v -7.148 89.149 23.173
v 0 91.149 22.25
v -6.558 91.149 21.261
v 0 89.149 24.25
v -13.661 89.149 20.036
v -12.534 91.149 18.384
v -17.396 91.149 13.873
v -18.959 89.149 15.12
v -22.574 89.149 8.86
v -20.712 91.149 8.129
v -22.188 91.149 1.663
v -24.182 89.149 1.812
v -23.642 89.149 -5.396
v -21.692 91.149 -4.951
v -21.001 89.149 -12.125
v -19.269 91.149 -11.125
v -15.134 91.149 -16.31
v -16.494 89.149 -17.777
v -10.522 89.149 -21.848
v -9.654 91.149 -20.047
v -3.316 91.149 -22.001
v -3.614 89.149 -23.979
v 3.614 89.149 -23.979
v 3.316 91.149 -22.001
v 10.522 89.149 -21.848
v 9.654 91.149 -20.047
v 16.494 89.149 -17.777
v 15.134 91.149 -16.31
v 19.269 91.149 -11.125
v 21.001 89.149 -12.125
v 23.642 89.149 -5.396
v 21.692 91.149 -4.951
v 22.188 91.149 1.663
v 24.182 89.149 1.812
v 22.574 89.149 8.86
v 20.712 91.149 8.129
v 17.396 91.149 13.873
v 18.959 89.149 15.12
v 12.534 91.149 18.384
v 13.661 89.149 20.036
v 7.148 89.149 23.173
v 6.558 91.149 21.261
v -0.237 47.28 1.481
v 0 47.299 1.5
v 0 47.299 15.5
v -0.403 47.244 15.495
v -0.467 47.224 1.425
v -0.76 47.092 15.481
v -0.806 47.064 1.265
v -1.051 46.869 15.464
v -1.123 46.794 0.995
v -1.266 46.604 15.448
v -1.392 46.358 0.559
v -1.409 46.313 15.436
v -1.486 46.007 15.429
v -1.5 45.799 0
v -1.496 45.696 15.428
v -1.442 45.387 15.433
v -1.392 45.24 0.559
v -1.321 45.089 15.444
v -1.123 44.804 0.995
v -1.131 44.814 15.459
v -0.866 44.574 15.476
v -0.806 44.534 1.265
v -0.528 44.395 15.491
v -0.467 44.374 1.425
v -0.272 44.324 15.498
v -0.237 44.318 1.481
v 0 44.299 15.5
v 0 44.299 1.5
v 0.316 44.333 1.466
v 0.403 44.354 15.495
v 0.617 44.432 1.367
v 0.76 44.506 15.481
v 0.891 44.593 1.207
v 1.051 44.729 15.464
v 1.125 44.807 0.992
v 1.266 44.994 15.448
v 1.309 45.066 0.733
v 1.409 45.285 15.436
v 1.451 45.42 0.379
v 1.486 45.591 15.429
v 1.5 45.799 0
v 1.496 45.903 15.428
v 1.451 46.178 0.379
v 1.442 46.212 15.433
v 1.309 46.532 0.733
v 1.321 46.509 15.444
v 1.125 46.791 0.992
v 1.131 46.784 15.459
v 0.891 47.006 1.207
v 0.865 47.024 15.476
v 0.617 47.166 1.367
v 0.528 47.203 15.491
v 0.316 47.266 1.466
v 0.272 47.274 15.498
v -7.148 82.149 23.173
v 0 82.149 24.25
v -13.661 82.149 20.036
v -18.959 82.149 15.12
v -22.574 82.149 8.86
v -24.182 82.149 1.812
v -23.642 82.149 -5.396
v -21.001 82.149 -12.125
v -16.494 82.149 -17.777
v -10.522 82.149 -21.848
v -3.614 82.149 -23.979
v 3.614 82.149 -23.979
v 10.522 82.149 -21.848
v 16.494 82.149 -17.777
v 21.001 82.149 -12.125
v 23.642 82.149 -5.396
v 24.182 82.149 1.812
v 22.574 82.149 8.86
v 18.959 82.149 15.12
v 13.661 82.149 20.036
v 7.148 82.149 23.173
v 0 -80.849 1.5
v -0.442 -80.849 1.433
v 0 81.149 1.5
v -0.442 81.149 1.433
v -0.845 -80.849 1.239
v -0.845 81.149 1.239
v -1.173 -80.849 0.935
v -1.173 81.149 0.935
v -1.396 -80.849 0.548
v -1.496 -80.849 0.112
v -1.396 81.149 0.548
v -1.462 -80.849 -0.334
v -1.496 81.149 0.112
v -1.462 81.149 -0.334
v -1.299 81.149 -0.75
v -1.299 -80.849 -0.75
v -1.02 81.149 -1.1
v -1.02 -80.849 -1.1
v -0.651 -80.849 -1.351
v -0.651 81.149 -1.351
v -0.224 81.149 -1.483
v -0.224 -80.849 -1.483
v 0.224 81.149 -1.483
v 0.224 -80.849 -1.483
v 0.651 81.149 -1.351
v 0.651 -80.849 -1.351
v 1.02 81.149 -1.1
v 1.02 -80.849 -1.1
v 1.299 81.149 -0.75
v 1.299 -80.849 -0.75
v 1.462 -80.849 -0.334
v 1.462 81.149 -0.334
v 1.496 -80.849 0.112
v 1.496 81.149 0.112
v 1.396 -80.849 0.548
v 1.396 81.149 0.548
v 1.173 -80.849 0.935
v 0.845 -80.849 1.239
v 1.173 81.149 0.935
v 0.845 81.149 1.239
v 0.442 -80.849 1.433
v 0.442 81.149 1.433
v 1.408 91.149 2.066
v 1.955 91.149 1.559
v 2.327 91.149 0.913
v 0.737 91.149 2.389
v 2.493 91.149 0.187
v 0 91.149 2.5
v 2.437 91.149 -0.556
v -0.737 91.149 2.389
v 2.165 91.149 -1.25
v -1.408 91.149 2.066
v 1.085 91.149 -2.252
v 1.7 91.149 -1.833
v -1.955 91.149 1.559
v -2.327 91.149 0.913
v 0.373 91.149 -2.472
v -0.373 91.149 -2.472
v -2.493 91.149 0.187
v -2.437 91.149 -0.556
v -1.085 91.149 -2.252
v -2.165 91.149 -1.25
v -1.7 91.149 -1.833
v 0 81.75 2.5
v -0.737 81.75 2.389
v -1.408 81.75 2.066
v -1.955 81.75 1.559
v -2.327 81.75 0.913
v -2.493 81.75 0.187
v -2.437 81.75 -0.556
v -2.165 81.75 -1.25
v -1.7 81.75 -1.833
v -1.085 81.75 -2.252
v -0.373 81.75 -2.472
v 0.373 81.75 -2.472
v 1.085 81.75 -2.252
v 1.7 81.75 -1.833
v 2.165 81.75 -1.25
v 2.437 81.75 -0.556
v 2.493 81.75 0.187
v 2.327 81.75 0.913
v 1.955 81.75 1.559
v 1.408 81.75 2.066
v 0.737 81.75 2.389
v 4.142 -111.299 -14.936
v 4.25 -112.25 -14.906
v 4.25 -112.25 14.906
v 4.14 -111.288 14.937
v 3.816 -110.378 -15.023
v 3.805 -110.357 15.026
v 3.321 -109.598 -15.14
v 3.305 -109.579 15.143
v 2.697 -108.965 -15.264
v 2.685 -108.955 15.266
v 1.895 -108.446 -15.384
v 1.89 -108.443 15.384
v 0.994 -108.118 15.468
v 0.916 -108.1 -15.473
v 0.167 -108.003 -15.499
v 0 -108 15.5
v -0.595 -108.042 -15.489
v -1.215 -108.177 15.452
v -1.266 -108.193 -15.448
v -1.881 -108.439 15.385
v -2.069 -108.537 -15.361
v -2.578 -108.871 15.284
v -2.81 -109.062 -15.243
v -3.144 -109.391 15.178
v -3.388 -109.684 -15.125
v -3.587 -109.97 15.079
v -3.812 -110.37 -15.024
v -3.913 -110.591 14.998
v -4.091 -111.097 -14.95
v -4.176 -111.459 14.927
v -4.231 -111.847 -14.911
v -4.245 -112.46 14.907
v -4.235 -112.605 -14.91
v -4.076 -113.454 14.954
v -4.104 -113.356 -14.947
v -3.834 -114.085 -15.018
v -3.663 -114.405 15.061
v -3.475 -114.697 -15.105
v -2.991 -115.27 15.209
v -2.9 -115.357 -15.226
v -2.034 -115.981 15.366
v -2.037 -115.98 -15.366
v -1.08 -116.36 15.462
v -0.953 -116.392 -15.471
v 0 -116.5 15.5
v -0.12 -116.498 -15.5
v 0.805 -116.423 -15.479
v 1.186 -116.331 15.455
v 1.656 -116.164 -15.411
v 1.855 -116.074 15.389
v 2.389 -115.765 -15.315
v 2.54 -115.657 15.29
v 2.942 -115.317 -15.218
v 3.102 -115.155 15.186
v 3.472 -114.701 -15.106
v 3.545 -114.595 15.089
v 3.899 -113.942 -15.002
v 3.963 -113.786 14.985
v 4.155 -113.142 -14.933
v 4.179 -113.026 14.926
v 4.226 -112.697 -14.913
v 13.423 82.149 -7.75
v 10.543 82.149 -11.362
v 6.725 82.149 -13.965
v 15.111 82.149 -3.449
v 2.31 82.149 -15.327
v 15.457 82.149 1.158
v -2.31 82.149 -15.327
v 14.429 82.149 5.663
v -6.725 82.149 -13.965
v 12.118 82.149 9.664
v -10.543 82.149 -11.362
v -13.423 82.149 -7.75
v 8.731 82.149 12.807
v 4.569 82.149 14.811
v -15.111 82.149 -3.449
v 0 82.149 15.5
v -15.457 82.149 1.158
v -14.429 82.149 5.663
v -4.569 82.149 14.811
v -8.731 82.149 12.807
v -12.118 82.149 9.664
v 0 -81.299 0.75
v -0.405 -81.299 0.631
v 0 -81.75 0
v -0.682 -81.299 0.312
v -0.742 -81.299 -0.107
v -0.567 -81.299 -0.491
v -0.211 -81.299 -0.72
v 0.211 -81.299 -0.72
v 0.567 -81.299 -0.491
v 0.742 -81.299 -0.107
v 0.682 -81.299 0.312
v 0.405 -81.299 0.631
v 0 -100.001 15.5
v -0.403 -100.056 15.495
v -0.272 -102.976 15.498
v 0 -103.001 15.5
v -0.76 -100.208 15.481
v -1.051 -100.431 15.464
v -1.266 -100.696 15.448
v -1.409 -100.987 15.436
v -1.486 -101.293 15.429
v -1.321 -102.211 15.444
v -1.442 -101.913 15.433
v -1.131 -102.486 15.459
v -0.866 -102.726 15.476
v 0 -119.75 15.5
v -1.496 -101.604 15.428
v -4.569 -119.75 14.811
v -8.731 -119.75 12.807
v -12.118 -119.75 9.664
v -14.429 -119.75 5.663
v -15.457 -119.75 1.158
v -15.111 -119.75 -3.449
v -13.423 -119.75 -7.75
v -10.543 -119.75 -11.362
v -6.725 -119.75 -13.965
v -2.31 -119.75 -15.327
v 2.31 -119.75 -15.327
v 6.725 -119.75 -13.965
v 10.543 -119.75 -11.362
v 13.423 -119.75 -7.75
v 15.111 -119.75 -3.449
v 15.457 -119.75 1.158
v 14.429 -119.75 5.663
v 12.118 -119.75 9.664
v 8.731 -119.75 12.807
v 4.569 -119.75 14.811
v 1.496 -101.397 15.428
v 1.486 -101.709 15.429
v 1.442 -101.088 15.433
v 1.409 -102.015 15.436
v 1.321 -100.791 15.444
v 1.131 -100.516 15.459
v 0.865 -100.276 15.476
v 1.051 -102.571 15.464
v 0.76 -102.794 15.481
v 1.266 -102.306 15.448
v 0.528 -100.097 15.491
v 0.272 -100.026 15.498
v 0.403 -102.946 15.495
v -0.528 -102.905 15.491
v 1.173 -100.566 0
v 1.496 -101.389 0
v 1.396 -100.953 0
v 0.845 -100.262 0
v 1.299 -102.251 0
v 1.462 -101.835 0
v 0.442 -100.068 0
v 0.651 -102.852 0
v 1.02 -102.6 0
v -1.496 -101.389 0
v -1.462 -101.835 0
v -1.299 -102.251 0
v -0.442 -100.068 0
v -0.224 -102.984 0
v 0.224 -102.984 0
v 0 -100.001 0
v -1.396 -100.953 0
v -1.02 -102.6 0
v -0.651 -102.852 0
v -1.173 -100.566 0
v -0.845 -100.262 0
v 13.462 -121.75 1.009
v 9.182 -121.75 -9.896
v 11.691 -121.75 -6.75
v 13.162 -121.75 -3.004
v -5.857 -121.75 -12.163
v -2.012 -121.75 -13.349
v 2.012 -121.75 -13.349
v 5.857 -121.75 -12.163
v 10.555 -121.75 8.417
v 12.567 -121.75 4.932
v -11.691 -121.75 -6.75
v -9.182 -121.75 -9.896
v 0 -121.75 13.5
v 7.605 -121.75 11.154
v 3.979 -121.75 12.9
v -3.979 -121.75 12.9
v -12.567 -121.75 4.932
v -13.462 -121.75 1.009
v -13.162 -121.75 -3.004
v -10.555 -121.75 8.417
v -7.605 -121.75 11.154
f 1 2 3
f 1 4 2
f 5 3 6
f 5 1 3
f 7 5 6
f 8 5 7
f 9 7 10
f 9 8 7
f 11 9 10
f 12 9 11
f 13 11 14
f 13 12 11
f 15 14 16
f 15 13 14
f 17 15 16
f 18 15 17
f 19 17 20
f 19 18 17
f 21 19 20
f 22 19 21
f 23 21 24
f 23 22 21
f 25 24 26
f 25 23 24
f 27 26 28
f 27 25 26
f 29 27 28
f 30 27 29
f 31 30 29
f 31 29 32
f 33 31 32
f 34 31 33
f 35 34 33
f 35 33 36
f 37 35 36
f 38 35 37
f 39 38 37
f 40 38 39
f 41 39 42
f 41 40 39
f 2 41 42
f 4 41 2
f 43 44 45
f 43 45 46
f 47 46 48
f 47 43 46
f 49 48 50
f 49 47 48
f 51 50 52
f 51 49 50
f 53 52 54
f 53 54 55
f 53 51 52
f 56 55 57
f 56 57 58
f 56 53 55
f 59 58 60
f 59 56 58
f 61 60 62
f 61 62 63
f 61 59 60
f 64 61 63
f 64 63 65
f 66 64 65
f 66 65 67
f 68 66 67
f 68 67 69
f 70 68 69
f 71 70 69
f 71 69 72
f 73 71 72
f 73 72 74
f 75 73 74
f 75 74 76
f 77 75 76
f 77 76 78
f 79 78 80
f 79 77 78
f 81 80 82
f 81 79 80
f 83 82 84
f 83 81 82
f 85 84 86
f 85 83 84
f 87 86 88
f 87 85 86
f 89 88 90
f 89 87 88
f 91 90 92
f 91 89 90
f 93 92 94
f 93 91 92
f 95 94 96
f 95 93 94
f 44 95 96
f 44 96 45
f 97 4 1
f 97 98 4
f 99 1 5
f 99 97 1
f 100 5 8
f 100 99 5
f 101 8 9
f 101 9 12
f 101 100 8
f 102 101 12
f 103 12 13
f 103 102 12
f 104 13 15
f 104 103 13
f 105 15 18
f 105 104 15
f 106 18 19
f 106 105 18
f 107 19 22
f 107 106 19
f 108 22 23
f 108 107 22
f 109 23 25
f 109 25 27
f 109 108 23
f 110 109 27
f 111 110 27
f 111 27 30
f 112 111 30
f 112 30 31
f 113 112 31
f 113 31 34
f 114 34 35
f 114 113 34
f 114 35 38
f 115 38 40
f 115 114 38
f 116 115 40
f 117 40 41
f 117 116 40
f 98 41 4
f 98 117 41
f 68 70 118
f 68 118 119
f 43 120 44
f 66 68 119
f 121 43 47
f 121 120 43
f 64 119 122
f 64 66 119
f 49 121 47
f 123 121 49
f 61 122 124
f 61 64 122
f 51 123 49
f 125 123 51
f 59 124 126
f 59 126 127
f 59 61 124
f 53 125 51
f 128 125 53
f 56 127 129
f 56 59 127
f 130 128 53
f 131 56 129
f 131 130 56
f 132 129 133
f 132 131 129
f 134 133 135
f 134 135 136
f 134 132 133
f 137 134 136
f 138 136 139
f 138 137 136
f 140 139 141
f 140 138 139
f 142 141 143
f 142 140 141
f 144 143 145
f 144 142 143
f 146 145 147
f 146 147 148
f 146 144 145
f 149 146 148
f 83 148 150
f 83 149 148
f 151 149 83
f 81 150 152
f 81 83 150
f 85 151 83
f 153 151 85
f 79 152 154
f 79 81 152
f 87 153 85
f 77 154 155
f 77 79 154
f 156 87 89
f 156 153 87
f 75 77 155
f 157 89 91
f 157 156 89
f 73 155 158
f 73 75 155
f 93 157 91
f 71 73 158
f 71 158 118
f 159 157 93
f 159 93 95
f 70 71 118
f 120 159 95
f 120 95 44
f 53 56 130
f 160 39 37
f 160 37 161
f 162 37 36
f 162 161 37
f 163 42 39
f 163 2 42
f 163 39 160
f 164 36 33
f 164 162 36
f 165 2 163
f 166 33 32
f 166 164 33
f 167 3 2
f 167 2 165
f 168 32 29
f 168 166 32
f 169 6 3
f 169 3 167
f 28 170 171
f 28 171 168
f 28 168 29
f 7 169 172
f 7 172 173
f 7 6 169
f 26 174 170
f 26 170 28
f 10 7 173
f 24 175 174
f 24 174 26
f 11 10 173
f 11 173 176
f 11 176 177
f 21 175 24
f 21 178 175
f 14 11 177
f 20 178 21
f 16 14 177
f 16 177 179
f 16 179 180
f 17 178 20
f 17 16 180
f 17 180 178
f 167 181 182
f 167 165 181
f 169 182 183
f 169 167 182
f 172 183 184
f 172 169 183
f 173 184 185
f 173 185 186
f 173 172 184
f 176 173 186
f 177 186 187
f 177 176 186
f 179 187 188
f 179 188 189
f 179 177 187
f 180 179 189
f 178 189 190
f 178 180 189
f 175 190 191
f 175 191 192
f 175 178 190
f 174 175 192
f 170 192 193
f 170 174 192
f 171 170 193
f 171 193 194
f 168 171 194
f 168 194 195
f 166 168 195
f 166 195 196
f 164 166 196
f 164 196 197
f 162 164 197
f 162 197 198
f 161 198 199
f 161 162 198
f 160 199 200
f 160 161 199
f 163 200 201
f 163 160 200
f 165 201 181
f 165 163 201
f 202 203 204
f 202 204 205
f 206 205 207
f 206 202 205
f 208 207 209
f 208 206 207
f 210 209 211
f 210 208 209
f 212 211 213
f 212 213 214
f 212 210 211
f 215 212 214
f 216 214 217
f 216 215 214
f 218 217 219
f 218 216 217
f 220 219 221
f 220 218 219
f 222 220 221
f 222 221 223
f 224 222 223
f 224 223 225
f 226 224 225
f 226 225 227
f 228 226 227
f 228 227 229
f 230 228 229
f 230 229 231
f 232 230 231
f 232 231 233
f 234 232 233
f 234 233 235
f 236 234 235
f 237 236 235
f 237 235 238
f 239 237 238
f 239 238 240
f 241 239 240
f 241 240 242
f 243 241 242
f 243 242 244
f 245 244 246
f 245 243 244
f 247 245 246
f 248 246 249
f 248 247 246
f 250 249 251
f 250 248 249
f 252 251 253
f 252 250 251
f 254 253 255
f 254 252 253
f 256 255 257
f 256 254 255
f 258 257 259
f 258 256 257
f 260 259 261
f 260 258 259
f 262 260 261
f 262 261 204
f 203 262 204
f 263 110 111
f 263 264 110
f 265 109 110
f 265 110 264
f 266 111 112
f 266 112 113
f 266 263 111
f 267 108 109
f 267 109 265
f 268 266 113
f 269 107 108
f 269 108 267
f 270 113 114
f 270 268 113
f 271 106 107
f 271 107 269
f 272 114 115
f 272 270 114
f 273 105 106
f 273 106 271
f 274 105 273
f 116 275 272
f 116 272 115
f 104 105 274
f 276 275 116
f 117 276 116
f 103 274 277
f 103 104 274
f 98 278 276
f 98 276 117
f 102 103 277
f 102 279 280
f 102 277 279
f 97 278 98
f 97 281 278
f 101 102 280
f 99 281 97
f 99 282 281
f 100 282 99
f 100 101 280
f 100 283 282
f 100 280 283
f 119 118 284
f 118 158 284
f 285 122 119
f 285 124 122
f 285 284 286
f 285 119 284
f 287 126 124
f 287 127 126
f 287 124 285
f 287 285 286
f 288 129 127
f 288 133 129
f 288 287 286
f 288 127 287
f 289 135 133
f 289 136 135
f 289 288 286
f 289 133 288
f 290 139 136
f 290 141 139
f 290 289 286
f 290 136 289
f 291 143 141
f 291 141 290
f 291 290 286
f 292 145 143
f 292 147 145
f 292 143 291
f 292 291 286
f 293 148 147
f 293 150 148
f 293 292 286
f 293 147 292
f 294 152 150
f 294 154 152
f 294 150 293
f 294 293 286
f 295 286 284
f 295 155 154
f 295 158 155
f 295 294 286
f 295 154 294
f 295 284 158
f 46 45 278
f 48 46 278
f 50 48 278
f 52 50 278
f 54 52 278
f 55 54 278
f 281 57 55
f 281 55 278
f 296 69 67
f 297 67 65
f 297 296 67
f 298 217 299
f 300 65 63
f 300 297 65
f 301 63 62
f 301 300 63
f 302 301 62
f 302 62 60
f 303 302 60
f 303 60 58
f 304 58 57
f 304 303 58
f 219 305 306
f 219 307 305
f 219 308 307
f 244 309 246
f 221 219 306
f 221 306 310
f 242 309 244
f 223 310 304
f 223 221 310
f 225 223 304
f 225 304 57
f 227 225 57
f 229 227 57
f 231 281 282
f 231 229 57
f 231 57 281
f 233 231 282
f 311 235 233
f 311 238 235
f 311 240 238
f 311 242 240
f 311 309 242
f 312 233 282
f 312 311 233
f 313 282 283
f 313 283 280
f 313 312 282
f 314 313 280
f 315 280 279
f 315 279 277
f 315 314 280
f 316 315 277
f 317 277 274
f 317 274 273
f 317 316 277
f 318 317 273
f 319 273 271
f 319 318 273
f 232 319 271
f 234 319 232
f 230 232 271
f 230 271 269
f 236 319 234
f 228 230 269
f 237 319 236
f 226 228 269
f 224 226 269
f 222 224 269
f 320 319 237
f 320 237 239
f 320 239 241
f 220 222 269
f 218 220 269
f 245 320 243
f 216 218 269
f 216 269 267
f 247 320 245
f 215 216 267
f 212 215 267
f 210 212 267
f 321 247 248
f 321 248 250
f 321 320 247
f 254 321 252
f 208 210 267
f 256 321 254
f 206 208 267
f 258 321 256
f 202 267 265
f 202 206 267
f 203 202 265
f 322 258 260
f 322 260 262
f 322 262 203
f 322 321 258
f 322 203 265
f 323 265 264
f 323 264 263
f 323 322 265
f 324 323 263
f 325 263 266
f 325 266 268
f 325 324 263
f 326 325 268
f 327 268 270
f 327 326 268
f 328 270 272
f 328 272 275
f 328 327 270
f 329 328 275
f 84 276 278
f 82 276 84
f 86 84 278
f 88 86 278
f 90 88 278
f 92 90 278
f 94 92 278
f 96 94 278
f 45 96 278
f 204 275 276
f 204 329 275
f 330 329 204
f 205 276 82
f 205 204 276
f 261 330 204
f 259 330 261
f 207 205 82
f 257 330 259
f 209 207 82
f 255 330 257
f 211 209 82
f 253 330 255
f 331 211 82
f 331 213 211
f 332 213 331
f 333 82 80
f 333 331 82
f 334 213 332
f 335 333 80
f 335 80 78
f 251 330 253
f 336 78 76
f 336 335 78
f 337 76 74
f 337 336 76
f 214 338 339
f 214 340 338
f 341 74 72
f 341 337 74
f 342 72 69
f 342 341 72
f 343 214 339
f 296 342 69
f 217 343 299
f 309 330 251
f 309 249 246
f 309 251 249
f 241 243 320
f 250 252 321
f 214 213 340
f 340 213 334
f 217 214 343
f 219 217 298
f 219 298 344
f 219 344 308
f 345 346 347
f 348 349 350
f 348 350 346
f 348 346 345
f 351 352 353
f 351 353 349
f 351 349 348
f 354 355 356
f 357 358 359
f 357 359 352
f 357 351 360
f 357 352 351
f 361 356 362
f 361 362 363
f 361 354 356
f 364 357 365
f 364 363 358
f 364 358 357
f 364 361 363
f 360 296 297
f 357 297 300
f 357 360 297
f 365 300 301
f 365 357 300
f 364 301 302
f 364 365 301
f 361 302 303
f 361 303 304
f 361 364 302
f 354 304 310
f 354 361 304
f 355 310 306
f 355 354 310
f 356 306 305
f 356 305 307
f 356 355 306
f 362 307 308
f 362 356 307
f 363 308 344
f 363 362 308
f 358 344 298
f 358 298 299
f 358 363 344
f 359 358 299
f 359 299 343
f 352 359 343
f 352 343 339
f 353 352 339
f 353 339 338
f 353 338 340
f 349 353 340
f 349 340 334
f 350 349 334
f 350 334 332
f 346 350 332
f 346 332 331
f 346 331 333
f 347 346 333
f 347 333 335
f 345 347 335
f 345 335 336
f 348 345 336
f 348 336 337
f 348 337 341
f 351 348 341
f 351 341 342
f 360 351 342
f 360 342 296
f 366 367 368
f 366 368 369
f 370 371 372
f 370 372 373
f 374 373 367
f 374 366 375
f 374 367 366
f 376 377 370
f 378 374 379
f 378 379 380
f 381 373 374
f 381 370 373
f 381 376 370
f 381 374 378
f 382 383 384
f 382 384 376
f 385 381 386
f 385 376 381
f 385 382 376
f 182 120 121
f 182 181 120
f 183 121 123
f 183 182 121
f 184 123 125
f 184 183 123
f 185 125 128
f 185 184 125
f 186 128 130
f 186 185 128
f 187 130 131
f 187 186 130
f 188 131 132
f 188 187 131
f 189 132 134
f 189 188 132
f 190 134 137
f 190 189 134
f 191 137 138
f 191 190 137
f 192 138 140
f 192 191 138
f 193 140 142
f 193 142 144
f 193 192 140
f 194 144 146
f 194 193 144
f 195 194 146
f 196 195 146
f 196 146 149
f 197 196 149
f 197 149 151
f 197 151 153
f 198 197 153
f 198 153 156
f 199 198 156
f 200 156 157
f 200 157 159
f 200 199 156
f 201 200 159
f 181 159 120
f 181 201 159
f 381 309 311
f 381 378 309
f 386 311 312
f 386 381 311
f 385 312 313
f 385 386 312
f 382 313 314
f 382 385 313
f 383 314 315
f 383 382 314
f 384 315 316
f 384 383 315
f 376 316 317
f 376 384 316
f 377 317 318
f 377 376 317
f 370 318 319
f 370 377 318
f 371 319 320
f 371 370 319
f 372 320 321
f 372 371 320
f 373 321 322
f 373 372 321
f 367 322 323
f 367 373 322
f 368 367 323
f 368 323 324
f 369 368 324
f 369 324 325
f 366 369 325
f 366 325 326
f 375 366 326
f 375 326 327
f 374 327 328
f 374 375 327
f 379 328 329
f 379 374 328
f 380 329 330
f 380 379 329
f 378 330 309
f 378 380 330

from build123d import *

# Parameters (mm, degrees)
ESBO_O2_R                  = 1.5
CORTE_EXTRUS_O1_DEPTH      = 127.487894678
CORTE_EXTRUS_O2_DEPTH      = 127.487894678
CORTE_EXTRUS_O2_DEPTH_BACK = 127.487894678
ESBO_O3_R                  = 4.25


with BuildPart() as part:
    # Esboço1 → Revolução1 (revolve)
    with BuildSketch(Plane(origin=(0, 0, 0), x_dir=(0, 0, -1), z_dir=(1, 0, 0)), mode=Mode.PRIVATE) as revolu_o1_sk:
        Polygon((2.5, 91.149139381), (22.25, 91.149139381), (24.25, 89.149139381), (24.25, 82.149139381), (15.5, 82.149139381), (15.5, -119.75), (13.5, -121.75), (0, -121.75), (0, -81.75), (1.5, -80.848709071), (1.5, 81.149139381), (2.5, 81.75), align=None)
    revolve(revolu_o1_sk.sketch.rotate(Axis((0, 121.75, 0), (0, -1, 0)), 180), axis=Axis((0, 121.75, 0), (0, -1, 0)))

    # Esboço2 → Corte-extrusão1 (cut, through all)
    with BuildSketch(Plane.XY):
        with Locations(Location((0, 45.799139381, 0), (0, 0, 90))):
            Circle(ESBO_O2_R)
        with Locations(Location((0, -101.500860619, 0), (0, 0, 90))):
            Circle(ESBO_O2_R)
    extrude(amount=CORTE_EXTRUS_O1_DEPTH, mode=Mode.SUBTRACT)

    # Esboço3 → Corte-extrusão2 (cut, two sides: drawn at the far end of the back side and taken through both)
    with BuildSketch(Plane.XY.offset(-CORTE_EXTRUS_O2_DEPTH_BACK)):
        with Locations((0, -112.25)):
            Circle(ESBO_O3_R)
    extrude(amount=CORTE_EXTRUS_O2_DEPTH + CORTE_EXTRUS_O2_DEPTH_BACK, mode=Mode.SUBTRACT)


solid = part.part
